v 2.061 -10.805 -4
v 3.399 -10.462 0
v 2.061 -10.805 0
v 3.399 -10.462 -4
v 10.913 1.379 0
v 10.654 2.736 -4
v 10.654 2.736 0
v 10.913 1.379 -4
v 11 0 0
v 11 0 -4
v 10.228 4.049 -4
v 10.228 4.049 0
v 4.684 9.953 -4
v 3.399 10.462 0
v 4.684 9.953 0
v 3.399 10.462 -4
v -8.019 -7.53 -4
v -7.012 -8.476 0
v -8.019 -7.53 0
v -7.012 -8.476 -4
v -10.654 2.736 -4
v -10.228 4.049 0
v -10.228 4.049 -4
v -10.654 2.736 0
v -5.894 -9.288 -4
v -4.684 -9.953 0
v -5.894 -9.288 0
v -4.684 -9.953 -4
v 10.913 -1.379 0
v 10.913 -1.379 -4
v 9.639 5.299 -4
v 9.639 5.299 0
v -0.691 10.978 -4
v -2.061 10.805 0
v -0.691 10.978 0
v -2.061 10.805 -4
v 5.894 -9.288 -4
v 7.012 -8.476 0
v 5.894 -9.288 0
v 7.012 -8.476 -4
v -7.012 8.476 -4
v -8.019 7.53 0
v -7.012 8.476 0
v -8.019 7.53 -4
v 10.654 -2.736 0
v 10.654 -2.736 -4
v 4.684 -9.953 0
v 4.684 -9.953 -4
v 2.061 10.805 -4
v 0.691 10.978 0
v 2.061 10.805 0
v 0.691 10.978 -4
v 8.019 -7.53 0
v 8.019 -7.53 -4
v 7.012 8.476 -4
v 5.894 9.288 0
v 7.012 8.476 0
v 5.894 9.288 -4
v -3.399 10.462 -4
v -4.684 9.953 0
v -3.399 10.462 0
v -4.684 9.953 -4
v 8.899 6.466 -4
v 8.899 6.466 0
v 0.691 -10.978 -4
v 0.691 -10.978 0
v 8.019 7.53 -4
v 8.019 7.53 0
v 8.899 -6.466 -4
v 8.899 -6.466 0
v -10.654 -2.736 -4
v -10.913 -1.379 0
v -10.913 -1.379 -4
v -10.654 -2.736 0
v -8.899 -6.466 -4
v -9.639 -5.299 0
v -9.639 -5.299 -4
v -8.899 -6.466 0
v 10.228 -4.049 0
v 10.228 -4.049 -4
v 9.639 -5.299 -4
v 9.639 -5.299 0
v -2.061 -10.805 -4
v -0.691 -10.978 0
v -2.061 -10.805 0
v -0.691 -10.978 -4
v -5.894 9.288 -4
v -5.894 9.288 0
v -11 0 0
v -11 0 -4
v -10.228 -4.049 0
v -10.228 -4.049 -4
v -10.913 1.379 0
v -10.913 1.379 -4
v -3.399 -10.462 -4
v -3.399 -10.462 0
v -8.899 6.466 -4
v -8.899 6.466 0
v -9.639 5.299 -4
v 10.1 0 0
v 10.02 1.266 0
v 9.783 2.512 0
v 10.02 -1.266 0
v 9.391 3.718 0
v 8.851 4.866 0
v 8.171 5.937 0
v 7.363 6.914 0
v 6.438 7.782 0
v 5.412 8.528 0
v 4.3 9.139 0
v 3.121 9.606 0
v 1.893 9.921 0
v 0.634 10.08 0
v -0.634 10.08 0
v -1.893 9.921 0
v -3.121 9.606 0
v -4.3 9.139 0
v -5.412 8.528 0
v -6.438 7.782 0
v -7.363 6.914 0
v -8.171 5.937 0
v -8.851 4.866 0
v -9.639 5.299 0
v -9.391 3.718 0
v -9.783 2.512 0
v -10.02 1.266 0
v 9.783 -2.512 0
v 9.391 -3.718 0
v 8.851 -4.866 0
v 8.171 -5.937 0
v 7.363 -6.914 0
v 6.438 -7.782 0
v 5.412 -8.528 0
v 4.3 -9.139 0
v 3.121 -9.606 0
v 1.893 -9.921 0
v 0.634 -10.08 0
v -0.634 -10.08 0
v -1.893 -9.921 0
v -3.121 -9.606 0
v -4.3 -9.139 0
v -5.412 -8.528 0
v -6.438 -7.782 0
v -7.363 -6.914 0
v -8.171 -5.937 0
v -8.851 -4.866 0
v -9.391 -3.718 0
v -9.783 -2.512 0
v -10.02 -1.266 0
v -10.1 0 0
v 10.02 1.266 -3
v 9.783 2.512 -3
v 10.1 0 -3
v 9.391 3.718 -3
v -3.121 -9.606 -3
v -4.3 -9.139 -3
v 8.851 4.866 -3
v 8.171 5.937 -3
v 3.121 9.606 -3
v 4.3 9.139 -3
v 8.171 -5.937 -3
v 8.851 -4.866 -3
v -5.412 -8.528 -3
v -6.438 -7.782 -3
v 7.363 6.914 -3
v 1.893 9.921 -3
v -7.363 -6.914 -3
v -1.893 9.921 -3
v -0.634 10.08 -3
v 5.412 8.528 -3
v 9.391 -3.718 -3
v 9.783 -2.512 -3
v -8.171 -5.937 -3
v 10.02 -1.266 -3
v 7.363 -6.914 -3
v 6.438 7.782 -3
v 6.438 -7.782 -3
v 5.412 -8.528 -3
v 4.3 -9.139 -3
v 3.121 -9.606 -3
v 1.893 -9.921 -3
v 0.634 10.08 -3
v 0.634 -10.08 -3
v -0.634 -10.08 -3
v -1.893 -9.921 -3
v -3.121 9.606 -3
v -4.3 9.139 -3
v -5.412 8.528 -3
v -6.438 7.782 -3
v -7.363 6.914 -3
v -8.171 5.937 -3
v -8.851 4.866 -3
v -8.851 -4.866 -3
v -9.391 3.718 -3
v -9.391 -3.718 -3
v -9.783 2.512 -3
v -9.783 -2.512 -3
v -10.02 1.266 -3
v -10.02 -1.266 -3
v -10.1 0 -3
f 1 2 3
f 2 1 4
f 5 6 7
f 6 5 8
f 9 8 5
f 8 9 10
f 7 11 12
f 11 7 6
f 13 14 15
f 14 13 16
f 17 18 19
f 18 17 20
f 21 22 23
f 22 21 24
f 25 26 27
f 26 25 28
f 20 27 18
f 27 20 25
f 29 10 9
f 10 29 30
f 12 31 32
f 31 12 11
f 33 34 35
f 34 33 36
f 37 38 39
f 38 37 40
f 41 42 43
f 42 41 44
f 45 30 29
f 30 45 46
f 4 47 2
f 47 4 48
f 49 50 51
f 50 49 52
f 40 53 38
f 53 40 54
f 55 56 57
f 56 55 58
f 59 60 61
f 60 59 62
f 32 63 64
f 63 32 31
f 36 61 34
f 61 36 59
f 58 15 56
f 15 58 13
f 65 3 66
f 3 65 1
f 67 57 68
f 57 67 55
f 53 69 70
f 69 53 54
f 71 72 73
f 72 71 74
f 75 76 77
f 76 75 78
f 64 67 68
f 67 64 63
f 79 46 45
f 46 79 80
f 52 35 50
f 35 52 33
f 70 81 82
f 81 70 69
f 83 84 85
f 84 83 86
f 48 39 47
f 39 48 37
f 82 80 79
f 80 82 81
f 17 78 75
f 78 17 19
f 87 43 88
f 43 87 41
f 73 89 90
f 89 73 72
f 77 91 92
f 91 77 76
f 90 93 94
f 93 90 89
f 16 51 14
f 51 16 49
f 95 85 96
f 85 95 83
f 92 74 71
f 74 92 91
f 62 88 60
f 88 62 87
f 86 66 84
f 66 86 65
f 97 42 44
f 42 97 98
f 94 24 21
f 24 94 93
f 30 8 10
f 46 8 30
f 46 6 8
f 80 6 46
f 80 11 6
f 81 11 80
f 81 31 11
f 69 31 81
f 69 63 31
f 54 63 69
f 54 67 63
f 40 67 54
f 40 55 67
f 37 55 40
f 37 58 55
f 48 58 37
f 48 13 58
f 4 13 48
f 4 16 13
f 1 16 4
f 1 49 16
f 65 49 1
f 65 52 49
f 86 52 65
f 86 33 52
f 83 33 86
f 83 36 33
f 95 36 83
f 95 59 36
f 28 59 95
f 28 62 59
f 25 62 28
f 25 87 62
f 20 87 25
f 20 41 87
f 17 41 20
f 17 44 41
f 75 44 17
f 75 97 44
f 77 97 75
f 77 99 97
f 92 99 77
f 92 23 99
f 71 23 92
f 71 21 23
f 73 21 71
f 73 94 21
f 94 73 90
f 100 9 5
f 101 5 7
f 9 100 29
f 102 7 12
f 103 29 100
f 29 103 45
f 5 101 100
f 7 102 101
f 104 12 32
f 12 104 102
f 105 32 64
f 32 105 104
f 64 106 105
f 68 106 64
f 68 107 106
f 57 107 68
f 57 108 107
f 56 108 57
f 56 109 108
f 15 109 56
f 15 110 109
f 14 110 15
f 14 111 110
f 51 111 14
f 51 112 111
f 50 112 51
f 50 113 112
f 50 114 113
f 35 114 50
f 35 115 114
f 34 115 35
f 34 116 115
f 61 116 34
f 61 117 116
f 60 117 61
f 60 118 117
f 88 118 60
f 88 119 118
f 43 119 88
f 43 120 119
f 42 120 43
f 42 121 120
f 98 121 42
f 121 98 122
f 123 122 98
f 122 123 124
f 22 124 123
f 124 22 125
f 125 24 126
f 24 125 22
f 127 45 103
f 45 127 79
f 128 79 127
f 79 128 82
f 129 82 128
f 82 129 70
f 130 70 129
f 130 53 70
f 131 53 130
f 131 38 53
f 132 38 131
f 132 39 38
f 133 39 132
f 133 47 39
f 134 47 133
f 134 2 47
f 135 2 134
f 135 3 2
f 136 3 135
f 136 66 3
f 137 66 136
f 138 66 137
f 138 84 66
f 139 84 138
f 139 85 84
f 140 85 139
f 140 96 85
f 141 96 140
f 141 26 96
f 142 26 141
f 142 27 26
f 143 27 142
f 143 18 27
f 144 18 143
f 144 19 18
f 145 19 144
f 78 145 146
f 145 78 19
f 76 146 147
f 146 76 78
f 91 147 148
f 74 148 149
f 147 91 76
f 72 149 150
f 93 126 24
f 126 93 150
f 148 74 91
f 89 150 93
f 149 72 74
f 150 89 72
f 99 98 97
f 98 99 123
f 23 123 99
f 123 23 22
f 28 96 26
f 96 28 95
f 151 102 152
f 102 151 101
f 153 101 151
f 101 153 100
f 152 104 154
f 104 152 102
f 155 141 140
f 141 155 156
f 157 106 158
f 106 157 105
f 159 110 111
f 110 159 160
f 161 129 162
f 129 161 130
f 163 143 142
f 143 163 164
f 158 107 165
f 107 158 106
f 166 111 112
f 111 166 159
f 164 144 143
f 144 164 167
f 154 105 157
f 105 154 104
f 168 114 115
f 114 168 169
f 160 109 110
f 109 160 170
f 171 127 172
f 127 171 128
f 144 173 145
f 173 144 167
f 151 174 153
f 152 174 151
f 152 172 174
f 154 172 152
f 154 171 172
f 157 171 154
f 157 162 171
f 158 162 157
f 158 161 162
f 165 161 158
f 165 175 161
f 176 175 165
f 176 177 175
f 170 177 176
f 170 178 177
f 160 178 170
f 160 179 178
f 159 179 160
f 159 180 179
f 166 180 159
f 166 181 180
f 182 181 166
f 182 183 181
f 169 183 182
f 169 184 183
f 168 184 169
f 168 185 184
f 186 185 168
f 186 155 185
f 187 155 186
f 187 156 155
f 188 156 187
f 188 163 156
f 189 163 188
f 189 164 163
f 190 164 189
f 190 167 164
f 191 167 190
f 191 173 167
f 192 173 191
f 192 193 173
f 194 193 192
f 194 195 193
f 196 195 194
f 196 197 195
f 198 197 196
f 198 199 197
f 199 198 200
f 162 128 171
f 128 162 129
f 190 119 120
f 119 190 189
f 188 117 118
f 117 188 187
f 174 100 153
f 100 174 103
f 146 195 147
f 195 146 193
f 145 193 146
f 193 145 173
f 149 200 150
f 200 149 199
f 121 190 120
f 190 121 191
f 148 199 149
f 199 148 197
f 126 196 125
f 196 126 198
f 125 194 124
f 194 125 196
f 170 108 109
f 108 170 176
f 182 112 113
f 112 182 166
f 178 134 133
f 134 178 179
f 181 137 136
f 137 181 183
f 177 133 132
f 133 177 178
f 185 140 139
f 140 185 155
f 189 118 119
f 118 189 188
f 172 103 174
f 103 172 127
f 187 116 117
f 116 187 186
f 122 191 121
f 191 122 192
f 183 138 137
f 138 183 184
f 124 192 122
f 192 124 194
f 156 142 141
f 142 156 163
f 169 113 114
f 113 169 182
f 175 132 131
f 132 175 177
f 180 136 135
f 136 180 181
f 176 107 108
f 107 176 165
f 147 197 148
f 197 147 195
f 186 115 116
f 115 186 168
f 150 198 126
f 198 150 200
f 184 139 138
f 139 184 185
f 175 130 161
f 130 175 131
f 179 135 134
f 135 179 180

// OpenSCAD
$fn = 50;


difference() {
	union() {
		translate(v = [0, 0, -4.0000000000]) {
			cylinder(h = 4, r = 11.0000000000);
		}
	}
	union() {
		#translate(v = [0, 0, -3.0000000000]) {
			cylinder(h = 3, r = 10.1000000000);
		}
	}
}
